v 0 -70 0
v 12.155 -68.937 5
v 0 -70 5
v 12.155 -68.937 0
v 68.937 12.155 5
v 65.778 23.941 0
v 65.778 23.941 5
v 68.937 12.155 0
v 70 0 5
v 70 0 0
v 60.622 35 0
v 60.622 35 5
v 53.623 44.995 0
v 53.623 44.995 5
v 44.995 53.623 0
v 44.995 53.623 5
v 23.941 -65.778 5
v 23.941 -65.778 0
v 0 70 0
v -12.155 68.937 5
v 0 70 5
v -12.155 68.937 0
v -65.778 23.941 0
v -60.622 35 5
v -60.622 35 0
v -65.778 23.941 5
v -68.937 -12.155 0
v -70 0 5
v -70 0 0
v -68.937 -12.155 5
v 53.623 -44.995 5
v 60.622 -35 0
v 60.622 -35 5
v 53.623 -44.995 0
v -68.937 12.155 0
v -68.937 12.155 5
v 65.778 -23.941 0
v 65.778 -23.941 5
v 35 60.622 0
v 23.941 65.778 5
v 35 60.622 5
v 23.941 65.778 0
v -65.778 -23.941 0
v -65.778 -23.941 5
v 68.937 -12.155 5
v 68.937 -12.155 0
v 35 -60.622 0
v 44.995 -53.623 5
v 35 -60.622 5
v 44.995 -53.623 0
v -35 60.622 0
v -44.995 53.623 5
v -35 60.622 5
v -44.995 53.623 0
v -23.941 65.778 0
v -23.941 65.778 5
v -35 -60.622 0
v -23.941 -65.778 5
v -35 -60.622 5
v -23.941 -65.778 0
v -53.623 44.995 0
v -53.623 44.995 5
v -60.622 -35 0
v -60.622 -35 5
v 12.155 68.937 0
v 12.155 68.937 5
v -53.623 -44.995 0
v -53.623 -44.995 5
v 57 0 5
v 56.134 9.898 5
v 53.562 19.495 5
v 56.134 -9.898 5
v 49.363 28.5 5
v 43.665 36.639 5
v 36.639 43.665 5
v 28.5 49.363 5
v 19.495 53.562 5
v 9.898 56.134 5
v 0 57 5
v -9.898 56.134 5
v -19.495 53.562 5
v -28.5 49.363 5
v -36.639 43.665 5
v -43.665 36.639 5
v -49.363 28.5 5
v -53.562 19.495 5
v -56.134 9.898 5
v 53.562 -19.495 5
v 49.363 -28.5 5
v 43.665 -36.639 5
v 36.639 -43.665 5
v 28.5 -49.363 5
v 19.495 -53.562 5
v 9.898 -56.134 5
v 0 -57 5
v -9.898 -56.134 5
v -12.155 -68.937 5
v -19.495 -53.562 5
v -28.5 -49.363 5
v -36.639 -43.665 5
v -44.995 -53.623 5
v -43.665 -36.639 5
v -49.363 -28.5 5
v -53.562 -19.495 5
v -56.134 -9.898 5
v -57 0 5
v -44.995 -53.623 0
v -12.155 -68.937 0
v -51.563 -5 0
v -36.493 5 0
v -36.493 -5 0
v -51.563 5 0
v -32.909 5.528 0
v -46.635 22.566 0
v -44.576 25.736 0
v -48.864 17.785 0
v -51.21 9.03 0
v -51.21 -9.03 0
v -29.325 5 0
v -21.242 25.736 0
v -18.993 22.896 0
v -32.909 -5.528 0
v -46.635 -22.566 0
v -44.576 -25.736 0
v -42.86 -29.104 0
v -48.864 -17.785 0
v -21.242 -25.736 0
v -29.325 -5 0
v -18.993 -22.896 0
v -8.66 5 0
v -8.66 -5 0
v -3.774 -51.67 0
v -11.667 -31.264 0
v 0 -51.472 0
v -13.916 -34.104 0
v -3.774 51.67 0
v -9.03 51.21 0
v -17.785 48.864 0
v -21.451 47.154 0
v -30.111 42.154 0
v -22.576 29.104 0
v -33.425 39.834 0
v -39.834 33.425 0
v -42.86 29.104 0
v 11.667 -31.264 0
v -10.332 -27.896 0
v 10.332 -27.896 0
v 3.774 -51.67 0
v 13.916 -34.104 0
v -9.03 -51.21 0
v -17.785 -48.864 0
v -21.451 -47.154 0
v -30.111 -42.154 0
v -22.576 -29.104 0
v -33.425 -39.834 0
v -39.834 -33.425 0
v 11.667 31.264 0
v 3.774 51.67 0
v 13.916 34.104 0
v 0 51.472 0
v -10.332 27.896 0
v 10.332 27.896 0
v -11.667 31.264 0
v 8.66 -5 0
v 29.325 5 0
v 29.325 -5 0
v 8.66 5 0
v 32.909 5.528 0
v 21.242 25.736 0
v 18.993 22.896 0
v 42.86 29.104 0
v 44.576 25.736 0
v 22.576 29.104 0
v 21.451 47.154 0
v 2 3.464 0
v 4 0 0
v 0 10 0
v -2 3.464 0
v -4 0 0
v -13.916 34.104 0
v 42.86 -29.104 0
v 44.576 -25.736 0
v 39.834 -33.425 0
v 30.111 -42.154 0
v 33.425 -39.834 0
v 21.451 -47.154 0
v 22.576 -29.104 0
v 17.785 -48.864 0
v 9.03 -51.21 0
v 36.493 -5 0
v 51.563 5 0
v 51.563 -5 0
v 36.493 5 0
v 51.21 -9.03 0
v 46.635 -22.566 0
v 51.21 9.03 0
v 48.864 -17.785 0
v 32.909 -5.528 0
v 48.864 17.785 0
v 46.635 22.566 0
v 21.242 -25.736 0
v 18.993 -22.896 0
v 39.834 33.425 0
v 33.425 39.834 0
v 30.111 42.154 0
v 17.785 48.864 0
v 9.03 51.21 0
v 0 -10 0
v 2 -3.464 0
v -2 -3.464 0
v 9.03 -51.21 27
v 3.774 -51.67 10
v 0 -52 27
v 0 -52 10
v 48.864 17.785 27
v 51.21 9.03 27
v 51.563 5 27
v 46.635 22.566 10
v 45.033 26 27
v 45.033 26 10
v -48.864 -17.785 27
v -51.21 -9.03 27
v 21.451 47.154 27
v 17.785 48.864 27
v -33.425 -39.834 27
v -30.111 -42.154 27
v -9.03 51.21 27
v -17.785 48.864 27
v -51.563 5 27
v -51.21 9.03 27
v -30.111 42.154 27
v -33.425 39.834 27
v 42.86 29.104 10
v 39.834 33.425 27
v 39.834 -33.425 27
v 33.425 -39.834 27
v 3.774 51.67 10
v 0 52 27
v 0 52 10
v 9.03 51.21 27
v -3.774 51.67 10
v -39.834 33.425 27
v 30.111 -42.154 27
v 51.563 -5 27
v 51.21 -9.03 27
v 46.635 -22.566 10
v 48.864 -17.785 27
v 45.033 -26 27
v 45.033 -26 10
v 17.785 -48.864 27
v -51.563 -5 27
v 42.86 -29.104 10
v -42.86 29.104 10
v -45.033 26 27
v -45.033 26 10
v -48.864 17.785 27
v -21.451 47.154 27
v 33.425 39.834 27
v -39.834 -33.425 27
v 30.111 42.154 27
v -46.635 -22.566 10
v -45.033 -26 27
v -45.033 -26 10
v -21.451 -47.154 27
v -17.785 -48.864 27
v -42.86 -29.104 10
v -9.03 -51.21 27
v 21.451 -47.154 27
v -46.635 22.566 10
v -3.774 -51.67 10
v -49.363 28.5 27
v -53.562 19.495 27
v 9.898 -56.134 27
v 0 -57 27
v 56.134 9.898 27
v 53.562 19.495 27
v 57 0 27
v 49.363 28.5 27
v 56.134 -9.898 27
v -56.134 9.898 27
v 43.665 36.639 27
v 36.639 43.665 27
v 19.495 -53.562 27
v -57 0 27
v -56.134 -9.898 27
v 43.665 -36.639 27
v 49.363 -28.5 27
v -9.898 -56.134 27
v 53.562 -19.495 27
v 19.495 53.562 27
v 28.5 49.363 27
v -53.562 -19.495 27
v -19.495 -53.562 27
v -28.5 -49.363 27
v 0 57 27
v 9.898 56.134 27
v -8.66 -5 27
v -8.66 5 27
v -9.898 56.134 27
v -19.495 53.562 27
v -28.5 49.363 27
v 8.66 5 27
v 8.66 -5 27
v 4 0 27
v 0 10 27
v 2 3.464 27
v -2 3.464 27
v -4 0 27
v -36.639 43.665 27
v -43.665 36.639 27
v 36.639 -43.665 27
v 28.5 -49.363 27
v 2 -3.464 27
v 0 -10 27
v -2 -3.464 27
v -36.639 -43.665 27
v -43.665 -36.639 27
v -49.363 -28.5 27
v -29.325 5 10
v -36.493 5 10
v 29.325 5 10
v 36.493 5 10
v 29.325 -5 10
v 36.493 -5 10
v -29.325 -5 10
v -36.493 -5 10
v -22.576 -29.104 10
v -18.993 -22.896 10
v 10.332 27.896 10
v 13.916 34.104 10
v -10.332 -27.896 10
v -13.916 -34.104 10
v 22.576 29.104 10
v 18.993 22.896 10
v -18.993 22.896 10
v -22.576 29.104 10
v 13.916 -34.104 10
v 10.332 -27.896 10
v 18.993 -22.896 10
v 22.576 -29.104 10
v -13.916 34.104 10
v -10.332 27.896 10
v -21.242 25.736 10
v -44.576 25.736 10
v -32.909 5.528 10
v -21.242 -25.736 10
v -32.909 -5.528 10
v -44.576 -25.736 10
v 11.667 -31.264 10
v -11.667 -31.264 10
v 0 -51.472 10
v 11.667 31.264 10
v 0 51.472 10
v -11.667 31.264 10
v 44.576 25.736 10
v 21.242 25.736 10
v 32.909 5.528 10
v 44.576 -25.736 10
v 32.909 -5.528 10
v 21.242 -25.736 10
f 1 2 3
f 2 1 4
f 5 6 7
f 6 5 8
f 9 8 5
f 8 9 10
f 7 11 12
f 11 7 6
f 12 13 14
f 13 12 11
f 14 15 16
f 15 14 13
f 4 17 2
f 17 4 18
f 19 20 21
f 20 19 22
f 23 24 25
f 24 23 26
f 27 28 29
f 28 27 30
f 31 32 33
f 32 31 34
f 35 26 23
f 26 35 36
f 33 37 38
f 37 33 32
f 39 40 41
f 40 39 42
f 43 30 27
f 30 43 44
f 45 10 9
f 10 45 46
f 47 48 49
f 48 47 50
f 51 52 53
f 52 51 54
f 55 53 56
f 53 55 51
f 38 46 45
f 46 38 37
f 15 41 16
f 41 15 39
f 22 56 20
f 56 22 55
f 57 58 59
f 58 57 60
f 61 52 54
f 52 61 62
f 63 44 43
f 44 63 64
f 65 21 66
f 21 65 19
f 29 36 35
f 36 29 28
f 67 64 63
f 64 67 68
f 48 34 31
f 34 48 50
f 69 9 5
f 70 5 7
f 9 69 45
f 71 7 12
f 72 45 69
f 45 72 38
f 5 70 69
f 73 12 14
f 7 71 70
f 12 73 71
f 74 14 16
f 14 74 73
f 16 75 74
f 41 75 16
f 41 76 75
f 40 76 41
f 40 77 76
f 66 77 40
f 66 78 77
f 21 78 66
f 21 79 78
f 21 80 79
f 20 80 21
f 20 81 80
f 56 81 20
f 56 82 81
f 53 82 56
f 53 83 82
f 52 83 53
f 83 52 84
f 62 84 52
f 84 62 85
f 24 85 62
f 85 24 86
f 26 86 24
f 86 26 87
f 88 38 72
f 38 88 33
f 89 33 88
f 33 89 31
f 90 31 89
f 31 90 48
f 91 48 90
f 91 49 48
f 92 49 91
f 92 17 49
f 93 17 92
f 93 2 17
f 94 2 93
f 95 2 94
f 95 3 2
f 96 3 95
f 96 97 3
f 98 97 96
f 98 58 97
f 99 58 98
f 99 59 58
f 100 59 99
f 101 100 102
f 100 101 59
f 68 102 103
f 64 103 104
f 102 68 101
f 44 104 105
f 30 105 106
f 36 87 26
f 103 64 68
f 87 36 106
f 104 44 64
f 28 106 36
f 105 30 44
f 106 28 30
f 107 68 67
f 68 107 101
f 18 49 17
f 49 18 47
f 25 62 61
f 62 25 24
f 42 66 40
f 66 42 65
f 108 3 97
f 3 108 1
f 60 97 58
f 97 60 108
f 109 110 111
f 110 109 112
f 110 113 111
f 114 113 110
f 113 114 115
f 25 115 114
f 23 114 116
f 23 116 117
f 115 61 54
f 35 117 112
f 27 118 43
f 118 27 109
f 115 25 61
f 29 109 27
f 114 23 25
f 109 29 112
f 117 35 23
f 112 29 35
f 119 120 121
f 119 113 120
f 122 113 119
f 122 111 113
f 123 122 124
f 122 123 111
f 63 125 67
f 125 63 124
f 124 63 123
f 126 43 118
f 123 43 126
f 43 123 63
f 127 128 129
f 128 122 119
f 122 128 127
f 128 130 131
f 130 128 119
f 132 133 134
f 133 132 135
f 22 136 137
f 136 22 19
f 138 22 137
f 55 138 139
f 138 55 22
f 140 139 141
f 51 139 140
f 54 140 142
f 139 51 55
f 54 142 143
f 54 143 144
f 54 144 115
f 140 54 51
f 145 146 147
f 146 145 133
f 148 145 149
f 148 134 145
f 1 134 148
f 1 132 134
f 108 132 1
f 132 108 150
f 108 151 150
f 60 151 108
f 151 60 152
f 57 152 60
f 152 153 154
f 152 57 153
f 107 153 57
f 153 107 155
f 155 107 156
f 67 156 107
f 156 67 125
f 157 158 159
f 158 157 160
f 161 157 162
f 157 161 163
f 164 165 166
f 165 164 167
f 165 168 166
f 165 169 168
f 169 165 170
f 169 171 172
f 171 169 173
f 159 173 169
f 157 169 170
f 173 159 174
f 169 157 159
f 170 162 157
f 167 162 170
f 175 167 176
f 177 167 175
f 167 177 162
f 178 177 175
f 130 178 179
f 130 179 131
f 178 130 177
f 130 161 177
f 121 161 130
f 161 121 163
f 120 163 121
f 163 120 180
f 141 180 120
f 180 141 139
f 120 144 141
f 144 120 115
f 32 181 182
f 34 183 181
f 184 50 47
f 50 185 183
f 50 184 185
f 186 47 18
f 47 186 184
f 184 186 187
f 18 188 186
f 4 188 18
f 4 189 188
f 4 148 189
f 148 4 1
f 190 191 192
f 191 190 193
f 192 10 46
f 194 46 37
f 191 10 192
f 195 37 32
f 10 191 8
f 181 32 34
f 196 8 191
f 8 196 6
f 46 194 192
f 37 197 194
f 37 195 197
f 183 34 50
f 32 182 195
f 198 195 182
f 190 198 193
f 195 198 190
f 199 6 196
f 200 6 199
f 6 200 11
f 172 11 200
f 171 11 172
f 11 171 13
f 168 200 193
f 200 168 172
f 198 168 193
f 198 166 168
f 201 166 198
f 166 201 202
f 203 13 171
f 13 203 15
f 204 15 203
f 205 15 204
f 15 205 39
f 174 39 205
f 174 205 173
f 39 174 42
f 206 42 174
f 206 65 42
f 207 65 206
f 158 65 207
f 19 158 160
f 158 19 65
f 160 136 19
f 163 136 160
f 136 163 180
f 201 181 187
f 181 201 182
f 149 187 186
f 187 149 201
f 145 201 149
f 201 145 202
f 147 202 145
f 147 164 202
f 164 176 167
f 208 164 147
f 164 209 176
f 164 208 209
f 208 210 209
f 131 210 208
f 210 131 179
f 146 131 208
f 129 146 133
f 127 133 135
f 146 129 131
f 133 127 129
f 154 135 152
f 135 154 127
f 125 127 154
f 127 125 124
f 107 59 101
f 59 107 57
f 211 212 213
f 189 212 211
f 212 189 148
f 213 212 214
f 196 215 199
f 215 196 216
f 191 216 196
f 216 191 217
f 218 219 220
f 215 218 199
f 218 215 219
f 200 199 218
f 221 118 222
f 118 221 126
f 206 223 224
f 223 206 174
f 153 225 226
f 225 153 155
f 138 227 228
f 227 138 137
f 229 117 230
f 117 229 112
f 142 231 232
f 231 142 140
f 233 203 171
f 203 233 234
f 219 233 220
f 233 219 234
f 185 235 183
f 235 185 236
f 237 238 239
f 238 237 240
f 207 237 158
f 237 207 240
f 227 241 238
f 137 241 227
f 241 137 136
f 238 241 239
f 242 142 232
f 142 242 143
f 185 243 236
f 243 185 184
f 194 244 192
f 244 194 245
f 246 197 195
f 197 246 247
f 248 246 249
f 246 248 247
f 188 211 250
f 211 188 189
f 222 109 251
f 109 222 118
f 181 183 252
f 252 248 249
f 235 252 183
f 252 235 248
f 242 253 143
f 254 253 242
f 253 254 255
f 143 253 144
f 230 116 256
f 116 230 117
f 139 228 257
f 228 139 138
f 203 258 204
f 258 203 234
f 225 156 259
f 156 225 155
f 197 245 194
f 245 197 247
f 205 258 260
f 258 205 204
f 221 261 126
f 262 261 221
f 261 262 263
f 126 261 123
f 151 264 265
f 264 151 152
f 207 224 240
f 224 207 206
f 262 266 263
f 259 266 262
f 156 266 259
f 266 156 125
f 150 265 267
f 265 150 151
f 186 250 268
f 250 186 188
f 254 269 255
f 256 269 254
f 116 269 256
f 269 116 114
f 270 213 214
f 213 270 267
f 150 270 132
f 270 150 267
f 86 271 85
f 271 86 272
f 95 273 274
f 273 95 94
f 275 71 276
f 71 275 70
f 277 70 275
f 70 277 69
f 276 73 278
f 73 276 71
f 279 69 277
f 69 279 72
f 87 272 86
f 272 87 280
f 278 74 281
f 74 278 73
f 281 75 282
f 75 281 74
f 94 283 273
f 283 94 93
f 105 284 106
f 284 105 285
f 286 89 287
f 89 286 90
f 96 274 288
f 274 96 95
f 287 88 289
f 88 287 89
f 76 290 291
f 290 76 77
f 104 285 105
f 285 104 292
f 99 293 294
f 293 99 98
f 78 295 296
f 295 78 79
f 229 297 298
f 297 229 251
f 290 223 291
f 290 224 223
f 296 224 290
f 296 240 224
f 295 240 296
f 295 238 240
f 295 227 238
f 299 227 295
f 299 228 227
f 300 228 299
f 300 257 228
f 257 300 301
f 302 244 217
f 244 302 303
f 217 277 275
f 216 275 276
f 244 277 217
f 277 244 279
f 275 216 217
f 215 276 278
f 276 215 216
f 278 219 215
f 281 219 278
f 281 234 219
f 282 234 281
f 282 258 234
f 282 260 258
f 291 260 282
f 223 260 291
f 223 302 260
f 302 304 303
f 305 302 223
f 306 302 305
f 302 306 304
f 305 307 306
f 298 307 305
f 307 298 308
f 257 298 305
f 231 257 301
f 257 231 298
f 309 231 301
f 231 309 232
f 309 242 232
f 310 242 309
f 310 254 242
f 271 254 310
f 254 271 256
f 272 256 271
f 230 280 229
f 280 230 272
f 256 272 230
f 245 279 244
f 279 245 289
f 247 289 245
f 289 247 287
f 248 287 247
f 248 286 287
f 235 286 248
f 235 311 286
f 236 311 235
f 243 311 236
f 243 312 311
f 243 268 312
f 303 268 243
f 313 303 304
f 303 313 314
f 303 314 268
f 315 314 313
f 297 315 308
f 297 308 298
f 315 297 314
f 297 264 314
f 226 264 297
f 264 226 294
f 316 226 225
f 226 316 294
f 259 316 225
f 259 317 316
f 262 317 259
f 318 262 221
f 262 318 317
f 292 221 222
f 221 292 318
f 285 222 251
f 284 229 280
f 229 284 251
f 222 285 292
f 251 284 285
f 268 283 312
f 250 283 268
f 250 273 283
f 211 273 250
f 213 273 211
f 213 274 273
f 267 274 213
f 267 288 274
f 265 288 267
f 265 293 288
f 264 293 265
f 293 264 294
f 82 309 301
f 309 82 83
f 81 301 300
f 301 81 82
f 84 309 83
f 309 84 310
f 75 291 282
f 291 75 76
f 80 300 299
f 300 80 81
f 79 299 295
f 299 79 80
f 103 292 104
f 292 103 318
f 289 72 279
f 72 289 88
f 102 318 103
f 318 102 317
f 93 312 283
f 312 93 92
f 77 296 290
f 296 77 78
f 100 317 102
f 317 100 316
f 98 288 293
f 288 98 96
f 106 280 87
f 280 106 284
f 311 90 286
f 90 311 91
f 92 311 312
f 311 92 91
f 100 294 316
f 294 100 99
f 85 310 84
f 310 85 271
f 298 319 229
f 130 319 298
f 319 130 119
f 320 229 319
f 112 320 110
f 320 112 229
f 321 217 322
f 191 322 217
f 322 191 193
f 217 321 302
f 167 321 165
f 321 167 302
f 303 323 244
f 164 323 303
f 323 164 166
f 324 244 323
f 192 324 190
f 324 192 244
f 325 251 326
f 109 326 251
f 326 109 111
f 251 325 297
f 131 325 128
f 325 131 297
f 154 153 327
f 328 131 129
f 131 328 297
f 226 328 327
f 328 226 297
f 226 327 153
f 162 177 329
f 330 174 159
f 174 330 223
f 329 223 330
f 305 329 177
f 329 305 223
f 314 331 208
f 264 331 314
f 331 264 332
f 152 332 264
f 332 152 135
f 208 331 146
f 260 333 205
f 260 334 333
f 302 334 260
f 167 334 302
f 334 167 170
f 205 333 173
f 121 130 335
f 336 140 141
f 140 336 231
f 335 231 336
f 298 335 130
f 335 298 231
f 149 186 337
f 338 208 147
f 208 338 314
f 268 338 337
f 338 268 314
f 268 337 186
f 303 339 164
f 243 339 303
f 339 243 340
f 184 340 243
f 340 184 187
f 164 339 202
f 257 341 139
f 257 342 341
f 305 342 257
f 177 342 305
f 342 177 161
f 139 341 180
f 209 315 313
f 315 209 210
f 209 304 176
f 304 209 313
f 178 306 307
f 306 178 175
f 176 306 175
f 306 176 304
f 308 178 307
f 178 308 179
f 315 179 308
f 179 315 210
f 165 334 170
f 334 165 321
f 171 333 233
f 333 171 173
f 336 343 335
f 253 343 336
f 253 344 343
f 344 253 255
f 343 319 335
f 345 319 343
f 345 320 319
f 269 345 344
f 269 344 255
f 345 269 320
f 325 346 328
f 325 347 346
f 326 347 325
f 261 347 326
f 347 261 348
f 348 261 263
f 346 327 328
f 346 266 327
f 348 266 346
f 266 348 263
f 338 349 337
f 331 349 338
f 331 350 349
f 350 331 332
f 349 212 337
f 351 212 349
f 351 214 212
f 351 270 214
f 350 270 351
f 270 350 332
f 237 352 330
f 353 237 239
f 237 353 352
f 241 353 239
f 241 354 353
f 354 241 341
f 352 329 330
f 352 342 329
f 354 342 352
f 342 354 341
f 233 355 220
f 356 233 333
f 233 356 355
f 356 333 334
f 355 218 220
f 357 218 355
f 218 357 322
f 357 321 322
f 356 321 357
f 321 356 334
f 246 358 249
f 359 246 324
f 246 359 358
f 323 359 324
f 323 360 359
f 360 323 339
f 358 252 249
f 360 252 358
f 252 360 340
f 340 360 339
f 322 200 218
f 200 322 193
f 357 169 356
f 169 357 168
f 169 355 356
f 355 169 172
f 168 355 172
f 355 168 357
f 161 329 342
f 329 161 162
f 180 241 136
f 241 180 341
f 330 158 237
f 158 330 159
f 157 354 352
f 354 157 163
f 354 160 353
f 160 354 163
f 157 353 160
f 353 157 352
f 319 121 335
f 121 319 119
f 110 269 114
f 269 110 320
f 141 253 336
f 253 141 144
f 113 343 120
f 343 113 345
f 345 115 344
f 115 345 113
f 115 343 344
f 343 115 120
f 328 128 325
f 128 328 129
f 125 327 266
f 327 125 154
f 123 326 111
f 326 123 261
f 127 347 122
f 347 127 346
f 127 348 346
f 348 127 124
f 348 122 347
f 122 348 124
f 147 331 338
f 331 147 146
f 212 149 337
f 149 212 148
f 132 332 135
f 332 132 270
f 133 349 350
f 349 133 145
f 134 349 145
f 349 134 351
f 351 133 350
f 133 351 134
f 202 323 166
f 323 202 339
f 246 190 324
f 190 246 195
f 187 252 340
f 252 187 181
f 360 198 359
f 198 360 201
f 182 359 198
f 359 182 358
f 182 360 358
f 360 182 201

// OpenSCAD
//A drain for our shower.
module drain(radius, height, depth, wall, fa) {
	union() { //The outer ring and shell.
        ring(radius=radius, innerradius=radius - wall - 5, height=height, fa=fa); //Outer ring.
        ring(radius=radius - wall, innerradius=radius - wall - 5, height=height + depth, fa=fa); //Shell.
        star(radius=radius - wall - 2.5, height=height + depth); //Bars extending from the centre.
        difference() {
            union() {
                for(a = [30 : 60 : 360]) {
                    rotate([0, 0, a]) {
                        translate([radius / 2 + 3, 0, 0]) {
                            triangle(sidelength=radius / 2, innersidelength=radius / 3, height=10);
                        }
                    }
                }
            }
            ring(radius=radius, innerradius=radius - wall - 2.5, height=height + depth, fa=fa);
        }
        //import("C:\\Users\\Ruben\\Desktop\\drain\\outerring.stl", convexity=4);
        //import("C:\\Users\\Ruben\\Desktop\\drain\\innerring.stl", convexity=4);
	}
}

//A hollow cylinder.
module ring(radius, innerradius, height, fa) {
    difference() {
        cylinder(h=height, r=radius, $fa=fa);
        cylinder(h=height, r=innerradius, $fa=fa);
    }
}

module star(radius, height) {
    difference() {
        union() {
            for(a = [0 : 60 : 360]) {
                center_bar(radius, height, 10, a);
            }
        }
        cylinder(r=4, h=height, $fn=6);
    }
}

module center_bar(radius, height, width, angle) {
    rotate([0, 0, angle]) {
        translate([-radius, -width / 2, 0]) {
            cube([radius * 2, width, height]);
        }
    }
}

module triangle(sidelength, innersidelength, height) {
    difference() {
        cylinder(h=height, r=sidelength * sqrt(3) / 3, $fn=3); //Radius of circumscribed circle of a triangle is sqrt(3)/3*sidelength.
        cylinder(h=height, r=innersidelength * sqrt(3) / 3, $fn=3);
    }
}

drain(radius=70, height=5, depth=22, wall=13, fa=10);
